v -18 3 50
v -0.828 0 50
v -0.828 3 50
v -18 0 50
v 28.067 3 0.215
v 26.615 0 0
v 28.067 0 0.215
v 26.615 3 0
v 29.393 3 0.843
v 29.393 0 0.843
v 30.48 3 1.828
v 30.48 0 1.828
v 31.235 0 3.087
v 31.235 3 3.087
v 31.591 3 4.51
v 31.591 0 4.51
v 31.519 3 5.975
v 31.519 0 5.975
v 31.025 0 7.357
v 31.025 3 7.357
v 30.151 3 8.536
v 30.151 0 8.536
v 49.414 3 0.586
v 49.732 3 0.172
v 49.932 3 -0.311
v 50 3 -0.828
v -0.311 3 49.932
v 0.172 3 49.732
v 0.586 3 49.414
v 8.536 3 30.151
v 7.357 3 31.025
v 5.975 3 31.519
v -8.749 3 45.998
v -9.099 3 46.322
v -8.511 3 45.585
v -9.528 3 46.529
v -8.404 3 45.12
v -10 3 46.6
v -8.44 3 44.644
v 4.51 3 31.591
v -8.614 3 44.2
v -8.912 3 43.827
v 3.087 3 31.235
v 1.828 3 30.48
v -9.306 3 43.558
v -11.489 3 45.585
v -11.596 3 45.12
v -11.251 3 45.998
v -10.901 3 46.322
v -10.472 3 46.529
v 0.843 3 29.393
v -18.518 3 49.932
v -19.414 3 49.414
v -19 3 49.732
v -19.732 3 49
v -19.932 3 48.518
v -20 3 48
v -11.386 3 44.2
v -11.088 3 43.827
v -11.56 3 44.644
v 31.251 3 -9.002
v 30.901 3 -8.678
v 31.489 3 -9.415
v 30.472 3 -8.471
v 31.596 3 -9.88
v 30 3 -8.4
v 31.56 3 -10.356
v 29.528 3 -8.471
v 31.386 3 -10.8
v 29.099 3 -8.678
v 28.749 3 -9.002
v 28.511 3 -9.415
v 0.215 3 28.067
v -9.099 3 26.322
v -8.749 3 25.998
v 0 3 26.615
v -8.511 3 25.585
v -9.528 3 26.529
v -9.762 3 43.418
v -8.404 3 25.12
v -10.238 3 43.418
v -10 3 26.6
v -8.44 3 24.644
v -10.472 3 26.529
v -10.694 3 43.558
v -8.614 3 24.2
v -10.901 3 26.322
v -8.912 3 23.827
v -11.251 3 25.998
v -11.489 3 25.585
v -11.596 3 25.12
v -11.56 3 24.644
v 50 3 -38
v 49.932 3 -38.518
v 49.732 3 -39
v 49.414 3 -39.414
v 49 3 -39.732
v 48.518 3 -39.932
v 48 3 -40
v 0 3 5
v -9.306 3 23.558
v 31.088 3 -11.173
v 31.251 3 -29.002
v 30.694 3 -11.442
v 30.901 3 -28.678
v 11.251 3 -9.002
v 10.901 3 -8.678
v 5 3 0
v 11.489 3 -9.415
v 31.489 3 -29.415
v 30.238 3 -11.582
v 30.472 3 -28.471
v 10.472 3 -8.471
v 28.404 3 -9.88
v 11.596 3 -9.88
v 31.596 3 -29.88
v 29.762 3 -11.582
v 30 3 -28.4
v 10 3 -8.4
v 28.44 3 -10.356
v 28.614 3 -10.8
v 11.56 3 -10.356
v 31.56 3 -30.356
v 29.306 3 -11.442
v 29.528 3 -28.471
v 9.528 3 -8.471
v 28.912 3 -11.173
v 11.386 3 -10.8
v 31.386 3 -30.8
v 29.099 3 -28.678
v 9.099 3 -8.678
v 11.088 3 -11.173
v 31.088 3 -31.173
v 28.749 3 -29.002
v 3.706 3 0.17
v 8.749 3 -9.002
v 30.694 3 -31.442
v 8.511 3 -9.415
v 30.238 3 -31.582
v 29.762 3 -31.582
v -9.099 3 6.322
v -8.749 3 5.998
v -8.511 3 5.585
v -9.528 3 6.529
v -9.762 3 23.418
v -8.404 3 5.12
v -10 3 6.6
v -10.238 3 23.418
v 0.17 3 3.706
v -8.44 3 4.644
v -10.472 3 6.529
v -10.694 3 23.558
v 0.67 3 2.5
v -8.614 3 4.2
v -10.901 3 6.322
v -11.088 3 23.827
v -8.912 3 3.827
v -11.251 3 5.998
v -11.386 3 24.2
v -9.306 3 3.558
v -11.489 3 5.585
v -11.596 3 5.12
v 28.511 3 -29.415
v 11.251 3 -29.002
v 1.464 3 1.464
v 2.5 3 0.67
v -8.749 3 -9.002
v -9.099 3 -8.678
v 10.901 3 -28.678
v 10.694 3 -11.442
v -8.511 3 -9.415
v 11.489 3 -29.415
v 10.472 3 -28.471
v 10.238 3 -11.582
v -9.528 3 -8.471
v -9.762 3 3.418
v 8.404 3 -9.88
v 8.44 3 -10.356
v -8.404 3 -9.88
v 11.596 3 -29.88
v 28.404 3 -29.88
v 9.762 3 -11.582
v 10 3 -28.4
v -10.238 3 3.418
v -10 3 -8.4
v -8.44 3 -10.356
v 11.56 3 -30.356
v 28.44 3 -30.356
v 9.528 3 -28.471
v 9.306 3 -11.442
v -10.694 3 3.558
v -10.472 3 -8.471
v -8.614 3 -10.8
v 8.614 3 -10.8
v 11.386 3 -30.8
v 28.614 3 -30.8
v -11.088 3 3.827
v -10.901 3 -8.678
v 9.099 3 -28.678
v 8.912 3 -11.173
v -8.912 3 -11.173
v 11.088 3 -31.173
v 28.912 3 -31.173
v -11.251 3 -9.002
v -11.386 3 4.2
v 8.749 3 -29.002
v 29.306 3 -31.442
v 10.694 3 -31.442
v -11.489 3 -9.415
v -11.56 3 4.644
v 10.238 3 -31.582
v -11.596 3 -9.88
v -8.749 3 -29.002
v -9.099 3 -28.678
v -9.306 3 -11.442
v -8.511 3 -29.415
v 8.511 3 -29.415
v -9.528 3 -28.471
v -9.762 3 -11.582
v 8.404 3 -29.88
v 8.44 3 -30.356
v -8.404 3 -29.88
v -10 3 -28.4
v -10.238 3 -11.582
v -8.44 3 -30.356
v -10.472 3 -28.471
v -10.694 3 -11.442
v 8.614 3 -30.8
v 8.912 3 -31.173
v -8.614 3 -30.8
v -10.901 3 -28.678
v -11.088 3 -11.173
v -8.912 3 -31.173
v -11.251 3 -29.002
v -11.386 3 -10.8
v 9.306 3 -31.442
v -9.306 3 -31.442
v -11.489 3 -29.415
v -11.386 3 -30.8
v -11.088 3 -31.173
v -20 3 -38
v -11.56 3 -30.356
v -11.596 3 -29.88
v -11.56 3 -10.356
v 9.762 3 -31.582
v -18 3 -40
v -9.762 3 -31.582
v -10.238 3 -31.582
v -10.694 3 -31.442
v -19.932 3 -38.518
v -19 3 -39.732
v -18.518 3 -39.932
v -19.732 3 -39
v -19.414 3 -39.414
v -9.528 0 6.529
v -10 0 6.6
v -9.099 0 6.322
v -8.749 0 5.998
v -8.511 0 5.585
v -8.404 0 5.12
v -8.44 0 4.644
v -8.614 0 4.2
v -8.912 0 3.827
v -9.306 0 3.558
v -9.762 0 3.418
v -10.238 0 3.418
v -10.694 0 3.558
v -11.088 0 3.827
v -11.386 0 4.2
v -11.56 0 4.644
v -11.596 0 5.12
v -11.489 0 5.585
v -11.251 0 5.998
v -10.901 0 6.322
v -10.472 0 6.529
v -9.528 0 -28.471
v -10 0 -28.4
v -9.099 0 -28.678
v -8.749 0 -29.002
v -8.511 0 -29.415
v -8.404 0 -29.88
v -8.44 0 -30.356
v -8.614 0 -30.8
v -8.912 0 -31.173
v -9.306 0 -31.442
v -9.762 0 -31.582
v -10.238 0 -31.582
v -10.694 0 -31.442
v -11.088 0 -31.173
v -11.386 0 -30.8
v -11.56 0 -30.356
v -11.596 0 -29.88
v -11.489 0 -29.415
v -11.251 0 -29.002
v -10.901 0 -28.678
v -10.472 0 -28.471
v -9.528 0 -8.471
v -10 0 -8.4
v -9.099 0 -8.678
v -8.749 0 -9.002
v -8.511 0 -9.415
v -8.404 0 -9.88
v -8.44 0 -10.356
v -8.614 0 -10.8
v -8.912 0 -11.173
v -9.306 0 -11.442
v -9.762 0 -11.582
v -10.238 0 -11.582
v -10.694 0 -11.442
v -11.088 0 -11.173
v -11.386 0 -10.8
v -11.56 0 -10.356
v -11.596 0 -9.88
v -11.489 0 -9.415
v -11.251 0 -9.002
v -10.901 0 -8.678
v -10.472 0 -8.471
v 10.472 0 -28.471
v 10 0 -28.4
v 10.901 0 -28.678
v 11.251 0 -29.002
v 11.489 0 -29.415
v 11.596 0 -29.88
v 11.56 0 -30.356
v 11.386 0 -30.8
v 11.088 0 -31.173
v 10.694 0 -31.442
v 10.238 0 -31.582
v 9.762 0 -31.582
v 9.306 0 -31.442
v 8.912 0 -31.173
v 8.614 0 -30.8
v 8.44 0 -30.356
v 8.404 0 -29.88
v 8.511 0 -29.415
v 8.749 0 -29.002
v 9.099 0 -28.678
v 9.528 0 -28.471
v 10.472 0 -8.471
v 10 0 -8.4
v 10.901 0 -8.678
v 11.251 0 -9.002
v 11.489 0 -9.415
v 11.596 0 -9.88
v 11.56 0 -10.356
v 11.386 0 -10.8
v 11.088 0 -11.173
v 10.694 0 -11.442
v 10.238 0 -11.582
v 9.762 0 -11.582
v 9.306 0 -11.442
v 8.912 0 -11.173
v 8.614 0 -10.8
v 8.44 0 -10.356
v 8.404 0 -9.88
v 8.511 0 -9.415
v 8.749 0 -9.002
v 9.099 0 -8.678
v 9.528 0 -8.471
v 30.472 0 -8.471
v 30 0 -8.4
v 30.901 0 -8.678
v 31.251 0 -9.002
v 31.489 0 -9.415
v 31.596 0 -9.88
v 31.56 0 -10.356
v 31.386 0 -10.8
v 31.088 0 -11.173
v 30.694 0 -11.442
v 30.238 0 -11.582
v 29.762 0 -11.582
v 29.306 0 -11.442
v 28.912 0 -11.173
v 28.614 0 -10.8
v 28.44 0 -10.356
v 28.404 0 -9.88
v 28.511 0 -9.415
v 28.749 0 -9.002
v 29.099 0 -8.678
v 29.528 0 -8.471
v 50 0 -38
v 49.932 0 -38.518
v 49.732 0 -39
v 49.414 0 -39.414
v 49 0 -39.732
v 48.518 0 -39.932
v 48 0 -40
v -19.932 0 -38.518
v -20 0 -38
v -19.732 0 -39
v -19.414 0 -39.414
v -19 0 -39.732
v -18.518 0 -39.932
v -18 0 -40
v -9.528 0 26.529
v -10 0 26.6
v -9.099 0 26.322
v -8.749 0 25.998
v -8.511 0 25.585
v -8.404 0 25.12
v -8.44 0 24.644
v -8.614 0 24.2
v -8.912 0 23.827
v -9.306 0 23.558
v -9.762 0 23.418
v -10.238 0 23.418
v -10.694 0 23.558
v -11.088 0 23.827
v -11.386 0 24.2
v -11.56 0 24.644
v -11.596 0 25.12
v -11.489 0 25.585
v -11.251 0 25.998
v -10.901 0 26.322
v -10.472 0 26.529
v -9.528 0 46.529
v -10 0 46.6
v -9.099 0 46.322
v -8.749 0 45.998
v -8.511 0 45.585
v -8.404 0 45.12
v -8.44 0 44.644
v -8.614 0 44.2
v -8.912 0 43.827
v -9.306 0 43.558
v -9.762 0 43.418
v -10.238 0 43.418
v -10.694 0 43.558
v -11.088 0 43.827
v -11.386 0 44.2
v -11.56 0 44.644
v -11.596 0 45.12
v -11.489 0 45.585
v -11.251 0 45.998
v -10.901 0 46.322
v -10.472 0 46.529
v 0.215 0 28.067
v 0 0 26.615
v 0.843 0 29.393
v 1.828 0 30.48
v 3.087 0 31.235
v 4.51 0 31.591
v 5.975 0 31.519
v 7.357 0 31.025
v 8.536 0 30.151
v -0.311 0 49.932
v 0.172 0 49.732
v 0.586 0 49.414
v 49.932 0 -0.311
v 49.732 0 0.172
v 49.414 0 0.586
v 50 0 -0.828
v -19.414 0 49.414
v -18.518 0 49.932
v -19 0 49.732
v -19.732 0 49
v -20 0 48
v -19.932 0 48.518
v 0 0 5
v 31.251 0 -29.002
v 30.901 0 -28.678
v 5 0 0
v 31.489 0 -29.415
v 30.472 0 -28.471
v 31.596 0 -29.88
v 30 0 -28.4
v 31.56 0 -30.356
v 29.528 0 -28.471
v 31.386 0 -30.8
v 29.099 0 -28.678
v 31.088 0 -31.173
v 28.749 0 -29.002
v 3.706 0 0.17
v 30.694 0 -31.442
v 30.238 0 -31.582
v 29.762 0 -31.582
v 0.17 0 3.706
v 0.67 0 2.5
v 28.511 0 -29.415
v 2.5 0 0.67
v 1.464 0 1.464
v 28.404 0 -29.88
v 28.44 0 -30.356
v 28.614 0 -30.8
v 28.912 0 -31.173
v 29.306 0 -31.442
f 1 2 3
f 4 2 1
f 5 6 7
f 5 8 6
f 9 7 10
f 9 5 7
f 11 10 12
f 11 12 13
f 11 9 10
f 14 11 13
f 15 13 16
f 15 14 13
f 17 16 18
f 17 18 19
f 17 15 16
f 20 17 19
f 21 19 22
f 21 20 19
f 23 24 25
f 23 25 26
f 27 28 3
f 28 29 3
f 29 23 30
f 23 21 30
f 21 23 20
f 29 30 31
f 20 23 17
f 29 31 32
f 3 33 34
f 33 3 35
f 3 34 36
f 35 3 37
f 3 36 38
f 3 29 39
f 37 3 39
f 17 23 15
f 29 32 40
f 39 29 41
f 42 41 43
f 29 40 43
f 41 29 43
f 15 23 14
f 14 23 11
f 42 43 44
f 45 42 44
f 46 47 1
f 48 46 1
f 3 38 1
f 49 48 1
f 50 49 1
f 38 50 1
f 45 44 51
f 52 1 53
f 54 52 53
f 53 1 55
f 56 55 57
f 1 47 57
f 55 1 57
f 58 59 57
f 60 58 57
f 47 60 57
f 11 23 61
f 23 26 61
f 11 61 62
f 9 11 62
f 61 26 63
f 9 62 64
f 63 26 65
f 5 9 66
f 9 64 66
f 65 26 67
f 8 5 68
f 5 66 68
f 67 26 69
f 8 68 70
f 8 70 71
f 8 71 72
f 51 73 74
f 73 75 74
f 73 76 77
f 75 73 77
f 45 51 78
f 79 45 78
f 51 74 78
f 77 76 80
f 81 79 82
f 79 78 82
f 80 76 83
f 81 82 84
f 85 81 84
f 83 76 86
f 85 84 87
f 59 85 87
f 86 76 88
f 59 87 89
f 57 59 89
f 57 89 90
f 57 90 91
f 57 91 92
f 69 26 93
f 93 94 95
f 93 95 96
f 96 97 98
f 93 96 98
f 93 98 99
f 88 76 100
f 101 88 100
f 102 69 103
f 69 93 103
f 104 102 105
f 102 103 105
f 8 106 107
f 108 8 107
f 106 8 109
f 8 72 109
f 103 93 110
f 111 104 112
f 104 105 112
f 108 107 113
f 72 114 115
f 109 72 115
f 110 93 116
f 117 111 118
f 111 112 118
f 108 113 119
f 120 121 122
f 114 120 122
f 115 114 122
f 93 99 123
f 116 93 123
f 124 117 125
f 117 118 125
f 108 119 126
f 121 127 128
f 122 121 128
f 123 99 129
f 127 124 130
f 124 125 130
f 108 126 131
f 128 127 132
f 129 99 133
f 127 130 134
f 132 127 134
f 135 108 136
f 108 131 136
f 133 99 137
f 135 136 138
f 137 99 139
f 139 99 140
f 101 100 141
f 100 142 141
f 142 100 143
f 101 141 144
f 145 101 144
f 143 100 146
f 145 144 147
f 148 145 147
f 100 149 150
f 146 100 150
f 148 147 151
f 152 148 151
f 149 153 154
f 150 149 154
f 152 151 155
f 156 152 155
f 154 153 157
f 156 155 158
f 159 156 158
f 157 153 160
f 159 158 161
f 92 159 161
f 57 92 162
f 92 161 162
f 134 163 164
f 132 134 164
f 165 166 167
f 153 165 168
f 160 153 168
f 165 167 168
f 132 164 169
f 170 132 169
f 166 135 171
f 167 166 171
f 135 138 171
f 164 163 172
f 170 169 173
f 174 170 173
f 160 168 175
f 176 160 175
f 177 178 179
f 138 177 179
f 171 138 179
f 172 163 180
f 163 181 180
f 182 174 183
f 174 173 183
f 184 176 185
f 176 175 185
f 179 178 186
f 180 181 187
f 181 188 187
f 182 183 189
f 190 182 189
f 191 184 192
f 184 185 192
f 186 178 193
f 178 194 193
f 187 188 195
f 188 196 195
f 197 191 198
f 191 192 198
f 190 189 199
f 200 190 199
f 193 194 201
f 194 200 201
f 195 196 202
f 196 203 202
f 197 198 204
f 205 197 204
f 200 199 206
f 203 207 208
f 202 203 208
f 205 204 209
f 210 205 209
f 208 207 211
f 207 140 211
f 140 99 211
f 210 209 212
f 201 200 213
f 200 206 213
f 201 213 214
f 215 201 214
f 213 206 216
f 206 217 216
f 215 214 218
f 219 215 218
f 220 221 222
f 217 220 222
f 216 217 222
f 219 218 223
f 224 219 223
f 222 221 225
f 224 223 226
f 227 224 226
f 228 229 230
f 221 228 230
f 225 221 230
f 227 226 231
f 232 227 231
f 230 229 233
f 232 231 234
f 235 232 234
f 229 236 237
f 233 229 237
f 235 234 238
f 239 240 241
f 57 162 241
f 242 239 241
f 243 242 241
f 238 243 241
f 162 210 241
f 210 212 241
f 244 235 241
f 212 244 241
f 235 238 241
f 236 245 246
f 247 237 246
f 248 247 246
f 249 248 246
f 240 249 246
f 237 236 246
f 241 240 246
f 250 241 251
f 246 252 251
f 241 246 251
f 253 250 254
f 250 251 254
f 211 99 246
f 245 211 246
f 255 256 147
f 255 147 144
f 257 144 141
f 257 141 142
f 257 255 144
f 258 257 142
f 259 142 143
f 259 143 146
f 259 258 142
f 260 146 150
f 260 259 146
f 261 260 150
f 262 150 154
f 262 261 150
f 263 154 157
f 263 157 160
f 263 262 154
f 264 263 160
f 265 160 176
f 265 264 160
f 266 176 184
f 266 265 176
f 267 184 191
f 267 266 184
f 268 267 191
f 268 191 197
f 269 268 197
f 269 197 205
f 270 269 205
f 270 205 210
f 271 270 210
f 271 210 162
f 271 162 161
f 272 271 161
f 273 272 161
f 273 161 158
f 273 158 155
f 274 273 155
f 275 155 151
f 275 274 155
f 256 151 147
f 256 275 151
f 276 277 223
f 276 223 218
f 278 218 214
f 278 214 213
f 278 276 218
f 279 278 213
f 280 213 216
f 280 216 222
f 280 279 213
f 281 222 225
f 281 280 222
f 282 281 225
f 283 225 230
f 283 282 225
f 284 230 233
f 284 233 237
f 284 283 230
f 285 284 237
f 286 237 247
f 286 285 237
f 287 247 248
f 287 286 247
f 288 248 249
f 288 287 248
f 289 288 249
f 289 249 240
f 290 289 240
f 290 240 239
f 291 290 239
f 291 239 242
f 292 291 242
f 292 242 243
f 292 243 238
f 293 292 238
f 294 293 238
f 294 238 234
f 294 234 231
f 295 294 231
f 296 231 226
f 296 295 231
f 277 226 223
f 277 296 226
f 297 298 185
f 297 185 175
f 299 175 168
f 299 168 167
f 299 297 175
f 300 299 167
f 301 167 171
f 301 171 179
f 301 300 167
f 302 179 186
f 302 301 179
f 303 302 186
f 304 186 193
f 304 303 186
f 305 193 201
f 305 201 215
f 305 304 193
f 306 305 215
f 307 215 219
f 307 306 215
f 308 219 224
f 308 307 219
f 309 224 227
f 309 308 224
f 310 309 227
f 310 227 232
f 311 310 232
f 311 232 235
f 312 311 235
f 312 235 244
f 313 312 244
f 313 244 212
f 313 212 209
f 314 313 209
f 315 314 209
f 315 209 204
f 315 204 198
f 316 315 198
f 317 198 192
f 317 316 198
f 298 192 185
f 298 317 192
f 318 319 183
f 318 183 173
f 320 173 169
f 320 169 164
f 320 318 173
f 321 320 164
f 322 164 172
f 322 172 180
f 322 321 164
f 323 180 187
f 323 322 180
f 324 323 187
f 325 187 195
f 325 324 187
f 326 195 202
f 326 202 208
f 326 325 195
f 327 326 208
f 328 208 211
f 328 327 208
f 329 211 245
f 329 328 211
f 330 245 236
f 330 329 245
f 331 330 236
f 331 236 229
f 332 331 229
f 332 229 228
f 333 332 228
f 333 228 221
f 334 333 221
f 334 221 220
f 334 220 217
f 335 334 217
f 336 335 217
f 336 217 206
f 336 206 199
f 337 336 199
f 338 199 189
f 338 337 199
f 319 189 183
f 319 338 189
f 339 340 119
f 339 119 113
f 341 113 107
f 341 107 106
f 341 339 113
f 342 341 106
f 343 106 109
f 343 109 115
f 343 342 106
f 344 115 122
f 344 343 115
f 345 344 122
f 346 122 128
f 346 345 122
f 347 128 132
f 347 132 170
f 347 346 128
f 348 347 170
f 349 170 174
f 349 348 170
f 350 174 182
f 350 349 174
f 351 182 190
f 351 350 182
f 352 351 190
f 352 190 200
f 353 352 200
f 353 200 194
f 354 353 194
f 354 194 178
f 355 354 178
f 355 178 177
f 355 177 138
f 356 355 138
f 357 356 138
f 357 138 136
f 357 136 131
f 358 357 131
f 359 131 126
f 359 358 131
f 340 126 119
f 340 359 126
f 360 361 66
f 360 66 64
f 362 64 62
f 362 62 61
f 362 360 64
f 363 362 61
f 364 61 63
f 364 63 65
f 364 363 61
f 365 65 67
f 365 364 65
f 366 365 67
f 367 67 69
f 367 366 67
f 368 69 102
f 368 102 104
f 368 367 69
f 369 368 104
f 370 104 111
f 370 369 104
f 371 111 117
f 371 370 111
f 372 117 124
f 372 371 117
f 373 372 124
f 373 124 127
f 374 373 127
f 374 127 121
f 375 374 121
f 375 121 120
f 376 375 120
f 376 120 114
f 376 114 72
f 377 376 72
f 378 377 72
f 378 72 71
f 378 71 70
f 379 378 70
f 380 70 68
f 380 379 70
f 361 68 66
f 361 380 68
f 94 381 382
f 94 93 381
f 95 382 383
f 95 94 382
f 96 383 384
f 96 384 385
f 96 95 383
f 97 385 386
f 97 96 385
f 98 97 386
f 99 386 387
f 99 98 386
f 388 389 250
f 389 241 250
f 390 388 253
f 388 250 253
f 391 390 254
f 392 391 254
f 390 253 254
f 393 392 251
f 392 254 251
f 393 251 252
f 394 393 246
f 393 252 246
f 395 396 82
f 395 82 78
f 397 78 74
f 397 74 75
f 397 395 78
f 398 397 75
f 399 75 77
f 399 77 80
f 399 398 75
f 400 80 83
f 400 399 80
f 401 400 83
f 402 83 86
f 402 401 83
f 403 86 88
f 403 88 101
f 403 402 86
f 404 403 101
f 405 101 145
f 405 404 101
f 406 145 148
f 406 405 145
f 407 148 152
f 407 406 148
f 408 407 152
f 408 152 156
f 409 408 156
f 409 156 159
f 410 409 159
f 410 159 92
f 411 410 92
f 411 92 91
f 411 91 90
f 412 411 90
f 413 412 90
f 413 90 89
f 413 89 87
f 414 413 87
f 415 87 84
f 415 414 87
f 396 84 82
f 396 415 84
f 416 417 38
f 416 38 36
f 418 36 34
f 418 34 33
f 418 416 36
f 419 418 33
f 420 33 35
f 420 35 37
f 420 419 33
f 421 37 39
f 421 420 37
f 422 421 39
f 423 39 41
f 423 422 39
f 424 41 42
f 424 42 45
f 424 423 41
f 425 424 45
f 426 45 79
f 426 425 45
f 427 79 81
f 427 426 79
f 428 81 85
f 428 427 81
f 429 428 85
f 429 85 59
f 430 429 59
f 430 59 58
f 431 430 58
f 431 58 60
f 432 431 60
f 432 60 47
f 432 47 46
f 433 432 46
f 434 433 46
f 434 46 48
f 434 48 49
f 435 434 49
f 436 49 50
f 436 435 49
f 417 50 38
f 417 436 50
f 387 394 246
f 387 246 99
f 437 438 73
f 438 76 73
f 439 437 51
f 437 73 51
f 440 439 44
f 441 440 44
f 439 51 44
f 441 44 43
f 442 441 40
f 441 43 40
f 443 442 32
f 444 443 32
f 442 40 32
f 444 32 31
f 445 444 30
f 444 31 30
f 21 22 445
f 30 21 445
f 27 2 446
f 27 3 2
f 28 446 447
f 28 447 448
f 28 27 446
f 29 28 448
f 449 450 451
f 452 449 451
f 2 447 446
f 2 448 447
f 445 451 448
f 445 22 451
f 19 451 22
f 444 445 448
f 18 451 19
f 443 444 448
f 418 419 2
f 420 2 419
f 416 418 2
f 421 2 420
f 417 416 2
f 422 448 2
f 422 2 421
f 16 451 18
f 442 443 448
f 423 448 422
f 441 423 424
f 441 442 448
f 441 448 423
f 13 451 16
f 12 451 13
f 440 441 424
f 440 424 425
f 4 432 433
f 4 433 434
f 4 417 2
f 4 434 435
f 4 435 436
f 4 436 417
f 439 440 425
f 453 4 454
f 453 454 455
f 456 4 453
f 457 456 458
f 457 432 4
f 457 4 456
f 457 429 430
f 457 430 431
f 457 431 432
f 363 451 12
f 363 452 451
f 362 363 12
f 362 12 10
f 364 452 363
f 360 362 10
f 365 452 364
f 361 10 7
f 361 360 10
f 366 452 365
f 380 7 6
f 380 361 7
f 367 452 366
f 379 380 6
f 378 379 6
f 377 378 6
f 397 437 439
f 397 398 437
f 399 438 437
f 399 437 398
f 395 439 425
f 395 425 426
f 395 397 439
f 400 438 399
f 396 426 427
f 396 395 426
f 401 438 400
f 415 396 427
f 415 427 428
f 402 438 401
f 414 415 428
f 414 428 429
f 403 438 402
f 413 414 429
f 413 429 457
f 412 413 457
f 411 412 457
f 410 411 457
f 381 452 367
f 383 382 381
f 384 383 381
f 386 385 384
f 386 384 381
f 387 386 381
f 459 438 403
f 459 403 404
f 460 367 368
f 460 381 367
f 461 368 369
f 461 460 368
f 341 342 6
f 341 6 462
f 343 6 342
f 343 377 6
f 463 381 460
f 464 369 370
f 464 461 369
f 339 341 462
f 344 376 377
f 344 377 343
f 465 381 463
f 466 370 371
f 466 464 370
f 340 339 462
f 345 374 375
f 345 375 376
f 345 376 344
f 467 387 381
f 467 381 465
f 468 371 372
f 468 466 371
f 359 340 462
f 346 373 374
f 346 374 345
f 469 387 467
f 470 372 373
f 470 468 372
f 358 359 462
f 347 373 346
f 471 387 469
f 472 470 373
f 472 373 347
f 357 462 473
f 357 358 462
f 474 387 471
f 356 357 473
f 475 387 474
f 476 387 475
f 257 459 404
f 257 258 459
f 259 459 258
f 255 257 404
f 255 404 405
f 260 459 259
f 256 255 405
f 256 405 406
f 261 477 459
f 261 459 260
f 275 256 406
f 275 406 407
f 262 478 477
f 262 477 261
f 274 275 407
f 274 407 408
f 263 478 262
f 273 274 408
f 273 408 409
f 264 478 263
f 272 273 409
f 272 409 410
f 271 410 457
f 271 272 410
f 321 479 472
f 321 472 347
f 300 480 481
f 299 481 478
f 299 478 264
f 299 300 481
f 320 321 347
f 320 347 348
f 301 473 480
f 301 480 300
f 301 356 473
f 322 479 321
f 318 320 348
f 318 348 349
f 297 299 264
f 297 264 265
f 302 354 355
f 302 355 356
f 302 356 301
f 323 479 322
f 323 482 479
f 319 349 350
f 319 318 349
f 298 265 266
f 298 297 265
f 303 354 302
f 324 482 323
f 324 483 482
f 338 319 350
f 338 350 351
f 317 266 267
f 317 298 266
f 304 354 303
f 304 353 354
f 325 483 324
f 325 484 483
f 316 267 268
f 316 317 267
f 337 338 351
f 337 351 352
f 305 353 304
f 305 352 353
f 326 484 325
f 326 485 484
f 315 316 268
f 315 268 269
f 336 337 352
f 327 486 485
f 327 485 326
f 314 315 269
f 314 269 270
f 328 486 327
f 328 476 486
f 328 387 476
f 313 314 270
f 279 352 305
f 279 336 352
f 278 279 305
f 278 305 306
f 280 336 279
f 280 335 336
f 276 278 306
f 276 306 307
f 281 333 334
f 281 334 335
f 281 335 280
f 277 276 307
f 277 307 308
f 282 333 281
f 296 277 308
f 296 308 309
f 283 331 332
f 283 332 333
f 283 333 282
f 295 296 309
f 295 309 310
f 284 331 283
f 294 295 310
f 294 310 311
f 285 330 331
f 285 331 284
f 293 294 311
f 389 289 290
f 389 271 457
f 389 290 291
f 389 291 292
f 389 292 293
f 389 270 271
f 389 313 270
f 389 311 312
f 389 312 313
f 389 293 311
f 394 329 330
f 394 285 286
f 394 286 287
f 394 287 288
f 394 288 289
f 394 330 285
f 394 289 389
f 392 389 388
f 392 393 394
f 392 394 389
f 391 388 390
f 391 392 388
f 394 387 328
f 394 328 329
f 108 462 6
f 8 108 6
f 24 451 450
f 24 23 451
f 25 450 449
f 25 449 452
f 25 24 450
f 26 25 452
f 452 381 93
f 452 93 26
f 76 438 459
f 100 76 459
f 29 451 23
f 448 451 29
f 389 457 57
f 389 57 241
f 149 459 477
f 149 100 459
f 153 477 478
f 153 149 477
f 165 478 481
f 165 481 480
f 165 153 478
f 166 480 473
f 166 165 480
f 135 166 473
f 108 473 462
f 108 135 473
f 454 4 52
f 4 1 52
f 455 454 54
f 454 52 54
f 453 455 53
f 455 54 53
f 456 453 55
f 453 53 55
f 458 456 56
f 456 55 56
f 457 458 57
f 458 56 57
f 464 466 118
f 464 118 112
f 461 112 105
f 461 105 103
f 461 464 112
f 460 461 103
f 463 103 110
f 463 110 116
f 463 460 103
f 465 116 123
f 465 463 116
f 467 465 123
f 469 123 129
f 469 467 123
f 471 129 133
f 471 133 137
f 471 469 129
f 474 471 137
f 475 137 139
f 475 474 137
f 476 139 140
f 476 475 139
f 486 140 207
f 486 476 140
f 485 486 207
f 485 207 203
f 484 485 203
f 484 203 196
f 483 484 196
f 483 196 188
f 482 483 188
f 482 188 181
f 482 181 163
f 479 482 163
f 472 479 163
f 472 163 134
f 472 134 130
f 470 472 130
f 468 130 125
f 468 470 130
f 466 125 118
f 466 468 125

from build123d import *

# Parameters (mm, degrees)
SKETCH_1_R      = 1.6
EXTRUDE_1_DEPTH = 3
FILLET_1_R      = 2
FILLET_2_R      = 5


with BuildPart() as part:
    # 草图1 → 凸台-拉伸1 (new body)
    with BuildSketch(Plane(origin=(0, 0, 0), x_dir=(1, 0, 0), z_dir=(0, 1, 0))):
        Polygon((0, -50), (-20, -50), (-20, 40), (50, 40), (50, 0), align=None)
        with Locations(Location((-10, -5, 0), (0, 0, 270))):
            Circle(SKETCH_1_R, mode=Mode.SUBTRACT)
        with Locations(Location((-10, -25, 0), (0, 0, 270))):
            Circle(SKETCH_1_R, mode=Mode.SUBTRACT)
        with Locations(Location((-10, -45, 0), (0, 0, 270))):
            Circle(SKETCH_1_R, mode=Mode.SUBTRACT)
        with Locations(Location((-10, 10, 0), (0, 0, 270))):
            Circle(SKETCH_1_R, mode=Mode.SUBTRACT)
        with Locations(Location((-10, 30, 0), (0, 0, 270))):
            Circle(SKETCH_1_R, mode=Mode.SUBTRACT)
        with Locations(Location((10, 30, 0), (0, 0, 270))):
            Circle(SKETCH_1_R, mode=Mode.SUBTRACT)
        with Locations(Location((10, 10, 0), (0, 0, 270))):
            Circle(SKETCH_1_R, mode=Mode.SUBTRACT)
        with Locations(Location((30, 30, 0), (0, 0, 270))):
            Circle(SKETCH_1_R, mode=Mode.SUBTRACT)
        with Locations(Location((30, 10, 0), (0, 0, 270))):
            Circle(SKETCH_1_R, mode=Mode.SUBTRACT)
        Polygon((0, -38.686291501), (0, 0), (38.686291501, 0), align=None, mode=Mode.SUBTRACT)
    extrude(amount=EXTRUDE_1_DEPTH)

    # 圆角1
    fillet_1_edges = [part.edges().sort_by_distance(p)[0] for p in [
        (0, 1.5, 50),
        (-20, 1.5, 50),
        (-20, 1.5, -40),
        (50, 1.5, -40),
        (50, 1.5, 0),
    ]]
    fillet(fillet_1_edges, radius=FILLET_1_R)

    # 圆角2
    fillet_2_edges = [part.edges().sort_by_distance(p)[0] for p in [
        (38.686291501, 1.5, 0),
        (0, 1.5, 0),
        (0, 1.5, 38.686291501),
    ]]
    fillet(fillet_2_edges, radius=FILLET_2_R)


solid = part.part
